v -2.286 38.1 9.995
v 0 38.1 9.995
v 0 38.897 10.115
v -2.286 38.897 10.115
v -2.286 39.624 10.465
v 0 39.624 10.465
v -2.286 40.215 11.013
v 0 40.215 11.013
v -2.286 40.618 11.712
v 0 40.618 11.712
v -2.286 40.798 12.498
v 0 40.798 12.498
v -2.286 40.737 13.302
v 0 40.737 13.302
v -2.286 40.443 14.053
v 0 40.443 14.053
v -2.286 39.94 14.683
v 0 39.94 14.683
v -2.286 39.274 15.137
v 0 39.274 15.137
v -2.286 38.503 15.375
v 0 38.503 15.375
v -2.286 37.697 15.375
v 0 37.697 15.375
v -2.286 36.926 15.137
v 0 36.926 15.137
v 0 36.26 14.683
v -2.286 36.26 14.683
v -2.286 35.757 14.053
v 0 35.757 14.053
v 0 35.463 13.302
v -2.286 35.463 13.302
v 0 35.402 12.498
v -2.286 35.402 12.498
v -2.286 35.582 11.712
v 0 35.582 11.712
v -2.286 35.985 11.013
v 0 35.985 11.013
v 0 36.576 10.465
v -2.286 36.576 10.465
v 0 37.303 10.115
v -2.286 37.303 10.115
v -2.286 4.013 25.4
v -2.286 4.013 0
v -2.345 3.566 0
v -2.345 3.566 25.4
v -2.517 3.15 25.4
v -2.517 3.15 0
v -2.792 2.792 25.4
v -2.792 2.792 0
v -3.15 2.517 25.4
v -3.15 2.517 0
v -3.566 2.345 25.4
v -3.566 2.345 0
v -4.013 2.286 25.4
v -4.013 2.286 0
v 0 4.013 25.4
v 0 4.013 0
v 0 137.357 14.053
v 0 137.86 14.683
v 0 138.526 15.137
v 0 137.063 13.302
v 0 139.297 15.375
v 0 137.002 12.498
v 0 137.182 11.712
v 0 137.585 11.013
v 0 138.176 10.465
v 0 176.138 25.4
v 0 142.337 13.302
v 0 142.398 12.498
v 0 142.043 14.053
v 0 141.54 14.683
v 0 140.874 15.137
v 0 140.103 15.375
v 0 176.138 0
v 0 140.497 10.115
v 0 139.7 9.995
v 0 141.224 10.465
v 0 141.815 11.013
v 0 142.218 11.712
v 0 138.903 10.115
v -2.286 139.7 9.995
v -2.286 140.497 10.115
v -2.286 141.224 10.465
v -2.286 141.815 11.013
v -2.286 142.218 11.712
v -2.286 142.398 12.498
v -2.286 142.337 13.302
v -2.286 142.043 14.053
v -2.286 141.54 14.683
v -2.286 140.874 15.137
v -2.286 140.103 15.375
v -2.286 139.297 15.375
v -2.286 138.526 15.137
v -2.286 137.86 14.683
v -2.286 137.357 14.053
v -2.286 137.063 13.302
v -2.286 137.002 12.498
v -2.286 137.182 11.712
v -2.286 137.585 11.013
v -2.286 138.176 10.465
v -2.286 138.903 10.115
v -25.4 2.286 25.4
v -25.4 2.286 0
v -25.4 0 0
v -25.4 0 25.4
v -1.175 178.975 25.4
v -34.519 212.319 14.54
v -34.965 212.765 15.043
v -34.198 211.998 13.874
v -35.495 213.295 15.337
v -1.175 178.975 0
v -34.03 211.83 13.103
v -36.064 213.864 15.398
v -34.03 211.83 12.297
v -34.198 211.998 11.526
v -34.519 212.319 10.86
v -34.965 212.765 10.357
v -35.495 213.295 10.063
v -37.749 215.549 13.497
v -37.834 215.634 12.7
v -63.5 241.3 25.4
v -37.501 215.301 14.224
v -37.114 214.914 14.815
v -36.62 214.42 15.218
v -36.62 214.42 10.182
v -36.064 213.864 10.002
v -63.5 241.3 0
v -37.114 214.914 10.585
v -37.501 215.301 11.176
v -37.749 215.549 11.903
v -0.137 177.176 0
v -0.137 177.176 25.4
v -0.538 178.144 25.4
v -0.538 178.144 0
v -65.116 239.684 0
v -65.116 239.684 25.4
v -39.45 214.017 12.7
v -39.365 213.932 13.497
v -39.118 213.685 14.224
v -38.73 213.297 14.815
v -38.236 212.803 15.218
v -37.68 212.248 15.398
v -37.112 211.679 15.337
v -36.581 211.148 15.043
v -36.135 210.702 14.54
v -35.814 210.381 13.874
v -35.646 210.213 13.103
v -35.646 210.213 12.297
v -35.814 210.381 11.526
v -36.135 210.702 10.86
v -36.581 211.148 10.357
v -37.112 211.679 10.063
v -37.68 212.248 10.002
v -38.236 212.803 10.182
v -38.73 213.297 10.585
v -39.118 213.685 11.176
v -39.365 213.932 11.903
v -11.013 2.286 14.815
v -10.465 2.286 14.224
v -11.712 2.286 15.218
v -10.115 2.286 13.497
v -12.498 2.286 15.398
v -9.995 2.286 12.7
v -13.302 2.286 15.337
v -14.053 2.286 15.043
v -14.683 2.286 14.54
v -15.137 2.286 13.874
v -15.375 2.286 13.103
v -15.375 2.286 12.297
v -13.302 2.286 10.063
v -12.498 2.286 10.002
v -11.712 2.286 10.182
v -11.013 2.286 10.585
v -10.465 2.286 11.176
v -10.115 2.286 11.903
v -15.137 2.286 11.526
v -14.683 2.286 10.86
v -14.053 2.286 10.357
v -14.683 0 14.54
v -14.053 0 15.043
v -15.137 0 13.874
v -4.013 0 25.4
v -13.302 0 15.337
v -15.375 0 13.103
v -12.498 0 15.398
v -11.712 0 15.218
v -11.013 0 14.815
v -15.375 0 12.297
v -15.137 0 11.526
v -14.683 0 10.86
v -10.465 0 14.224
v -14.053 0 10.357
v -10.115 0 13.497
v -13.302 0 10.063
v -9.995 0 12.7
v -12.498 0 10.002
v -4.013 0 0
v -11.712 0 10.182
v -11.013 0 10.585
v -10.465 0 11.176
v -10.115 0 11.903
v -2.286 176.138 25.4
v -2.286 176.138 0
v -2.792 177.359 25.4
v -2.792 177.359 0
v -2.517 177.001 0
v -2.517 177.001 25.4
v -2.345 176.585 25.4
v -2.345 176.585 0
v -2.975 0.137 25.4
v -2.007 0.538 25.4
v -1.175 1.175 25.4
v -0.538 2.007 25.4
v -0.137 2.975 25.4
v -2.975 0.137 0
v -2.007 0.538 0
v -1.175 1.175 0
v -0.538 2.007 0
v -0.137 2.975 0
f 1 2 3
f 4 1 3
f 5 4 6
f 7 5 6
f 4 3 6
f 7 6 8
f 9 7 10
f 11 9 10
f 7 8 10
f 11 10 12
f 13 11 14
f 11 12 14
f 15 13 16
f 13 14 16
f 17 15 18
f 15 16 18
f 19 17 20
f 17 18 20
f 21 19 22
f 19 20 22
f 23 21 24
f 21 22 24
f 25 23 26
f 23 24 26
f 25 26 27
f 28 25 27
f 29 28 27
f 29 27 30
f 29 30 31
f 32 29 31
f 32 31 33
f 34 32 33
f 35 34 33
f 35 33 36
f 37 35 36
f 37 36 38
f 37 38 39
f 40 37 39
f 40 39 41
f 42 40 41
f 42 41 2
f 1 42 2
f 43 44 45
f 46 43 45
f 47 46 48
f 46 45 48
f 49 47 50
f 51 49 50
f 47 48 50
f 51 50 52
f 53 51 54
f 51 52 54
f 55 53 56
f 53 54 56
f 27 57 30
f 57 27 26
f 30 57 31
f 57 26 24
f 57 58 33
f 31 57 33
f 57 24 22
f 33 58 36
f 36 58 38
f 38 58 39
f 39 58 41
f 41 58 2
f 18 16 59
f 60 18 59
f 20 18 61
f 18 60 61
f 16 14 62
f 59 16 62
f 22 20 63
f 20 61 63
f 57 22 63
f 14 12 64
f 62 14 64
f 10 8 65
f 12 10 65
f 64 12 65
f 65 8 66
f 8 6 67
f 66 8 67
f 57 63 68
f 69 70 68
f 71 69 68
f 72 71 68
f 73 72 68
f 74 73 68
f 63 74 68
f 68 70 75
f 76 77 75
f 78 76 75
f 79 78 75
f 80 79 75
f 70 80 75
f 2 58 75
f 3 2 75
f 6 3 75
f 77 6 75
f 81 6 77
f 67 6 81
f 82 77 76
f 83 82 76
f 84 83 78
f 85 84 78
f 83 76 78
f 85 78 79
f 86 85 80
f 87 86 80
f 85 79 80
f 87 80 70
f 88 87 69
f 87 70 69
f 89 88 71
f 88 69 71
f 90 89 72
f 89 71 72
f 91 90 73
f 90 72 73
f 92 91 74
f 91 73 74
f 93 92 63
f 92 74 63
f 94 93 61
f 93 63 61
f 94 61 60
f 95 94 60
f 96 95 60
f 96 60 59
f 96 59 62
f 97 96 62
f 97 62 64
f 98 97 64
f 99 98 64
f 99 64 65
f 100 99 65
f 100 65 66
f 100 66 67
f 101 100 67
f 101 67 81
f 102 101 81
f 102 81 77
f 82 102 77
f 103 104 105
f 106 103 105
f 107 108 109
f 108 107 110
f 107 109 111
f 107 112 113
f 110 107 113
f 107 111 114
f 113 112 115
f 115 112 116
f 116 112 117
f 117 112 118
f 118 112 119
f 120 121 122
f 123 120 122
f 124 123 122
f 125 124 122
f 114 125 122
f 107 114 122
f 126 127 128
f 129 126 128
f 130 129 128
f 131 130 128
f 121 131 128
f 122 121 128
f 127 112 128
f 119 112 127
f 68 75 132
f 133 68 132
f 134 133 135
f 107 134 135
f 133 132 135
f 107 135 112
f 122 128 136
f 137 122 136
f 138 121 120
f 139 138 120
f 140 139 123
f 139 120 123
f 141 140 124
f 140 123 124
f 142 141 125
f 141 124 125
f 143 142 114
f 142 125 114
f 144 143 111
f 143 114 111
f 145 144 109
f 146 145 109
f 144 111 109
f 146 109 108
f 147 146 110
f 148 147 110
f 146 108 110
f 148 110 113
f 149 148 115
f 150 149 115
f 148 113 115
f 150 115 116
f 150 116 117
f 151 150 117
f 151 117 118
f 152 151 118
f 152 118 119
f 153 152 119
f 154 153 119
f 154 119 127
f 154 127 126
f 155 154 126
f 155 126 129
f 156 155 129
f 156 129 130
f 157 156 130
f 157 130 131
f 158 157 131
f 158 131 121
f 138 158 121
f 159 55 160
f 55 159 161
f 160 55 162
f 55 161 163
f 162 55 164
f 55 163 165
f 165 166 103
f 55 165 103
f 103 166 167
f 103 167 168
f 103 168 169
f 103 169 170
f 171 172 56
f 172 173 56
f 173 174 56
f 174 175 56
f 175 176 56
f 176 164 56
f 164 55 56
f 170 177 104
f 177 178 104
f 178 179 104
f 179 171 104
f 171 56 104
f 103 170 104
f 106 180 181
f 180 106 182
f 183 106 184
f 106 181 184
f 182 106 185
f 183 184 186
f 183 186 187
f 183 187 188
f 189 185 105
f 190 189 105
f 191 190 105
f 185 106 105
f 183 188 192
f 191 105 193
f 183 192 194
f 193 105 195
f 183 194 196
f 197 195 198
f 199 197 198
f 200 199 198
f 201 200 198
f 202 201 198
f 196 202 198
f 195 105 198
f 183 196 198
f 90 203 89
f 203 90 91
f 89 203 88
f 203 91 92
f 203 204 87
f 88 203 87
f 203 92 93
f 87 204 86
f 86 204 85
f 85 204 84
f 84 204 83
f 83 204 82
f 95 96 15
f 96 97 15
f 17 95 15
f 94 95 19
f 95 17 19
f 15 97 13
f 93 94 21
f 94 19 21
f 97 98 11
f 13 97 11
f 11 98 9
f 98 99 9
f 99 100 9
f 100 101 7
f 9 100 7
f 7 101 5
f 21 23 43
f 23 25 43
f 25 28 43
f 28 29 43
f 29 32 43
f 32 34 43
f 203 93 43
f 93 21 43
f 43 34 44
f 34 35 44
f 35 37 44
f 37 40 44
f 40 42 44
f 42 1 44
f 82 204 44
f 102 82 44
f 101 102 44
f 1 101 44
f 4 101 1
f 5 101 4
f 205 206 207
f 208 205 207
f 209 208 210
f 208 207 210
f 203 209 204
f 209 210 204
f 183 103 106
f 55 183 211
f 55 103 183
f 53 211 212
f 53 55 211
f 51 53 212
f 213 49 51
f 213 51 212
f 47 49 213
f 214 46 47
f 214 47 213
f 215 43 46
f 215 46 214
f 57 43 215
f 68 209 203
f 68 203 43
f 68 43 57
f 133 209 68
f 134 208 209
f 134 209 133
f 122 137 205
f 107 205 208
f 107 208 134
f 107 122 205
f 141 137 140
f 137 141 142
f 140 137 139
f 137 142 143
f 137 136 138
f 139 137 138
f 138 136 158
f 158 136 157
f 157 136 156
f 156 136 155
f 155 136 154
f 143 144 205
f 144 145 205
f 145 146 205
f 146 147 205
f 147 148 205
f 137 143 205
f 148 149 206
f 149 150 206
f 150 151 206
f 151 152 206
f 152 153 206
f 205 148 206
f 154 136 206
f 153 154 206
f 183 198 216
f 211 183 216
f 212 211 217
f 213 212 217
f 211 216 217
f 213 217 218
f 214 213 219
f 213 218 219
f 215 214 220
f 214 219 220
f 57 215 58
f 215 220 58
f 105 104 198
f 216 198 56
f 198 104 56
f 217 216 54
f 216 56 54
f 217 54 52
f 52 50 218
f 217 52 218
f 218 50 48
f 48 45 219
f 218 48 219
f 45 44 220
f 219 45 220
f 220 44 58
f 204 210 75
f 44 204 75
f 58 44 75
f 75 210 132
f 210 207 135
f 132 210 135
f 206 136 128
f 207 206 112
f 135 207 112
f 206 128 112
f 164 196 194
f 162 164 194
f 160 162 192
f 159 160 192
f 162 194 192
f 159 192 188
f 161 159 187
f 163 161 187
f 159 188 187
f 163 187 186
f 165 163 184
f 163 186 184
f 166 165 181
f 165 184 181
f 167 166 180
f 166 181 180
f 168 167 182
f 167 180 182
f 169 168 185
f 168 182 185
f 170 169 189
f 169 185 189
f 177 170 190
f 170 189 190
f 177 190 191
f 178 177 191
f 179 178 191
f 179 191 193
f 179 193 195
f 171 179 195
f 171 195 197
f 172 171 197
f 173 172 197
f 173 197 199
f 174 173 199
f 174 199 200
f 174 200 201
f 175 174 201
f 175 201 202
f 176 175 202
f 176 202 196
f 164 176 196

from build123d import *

# Parameters (mm, degrees)
BASE_FLANGE1_DEPTH = 25.4
CUT_EXTRUDE1_REACH = 253.219
SKETCH3_R          = 2.7051
CUT_EXTRUDE2_REACH = 220.156
SKETCH4_R          = 2.7051
CUT_EXTRUDE3_REACH = 253.219
SKETCH5_R          = 2.7051


# Sheet-metal steps are written as plain solids
with BuildPart() as part:
    # Sketch1 → Base-Flange1 (new body)
    with BuildSketch(Plane.XY):
        with BuildLine():
            Line((-25.4, 0), (-4.0132, 0))
            ThreePointArc((-4.0132, 0), (-1.175439066, 1.175439066), (0, 4.0132))
            Line((0, 4.0132), (0, 176.137678131))
            ThreePointArc((0, 176.137678131), (-0.30548666, 177.673463282), (-1.175439066, 178.975439066))
            Line((-1.175439066, 178.975439066), (-63.5, 241.3))
            Line((-63.5, 241.3), (-65.116446102, 239.683553898))
            Line((-65.116446102, 239.683553898), (-2.791885168, 177.358992964))
            ThreePointArc((-2.791885168, 177.358992964), (-2.417475271, 176.798648956), (-2.286, 176.137678131))
            Line((-2.286, 176.137678131), (-2.286, 4.0132))
            ThreePointArc((-2.286, 4.0132), (-2.791885168, 2.791885168), (-4.0132, 2.286))
            Line((-4.0132, 2.286), (-25.4, 2.286))
            Line((-25.4, 2.286), (-25.4, 0))
        make_face()
    extrude(amount=BASE_FLANGE1_DEPTH)

    # Sketch3 → Cut-Extrude1 (cut, up to next)
    with BuildSketch(Plane(origin=(0, 0, 0), x_dir=(0, 0, -1), z_dir=(1, 0, 0)), mode=Mode.PRIVATE) as cut_extrude1_sk1:
        with Locations((-12.7, 38.1)):
            Circle(SKETCH3_R)
    cut_extrude1_tool1 = extrude(cut_extrude1_sk1.sketch, amount=-CUT_EXTRUDE1_REACH, mode=Mode.PRIVATE) & part.part
    # Sketch3 → Cut-Extrude1 (cut, up to next)
    with BuildSketch(Plane(origin=(0, 0, 0), x_dir=(0, 0, -1), z_dir=(1, 0, 0)), mode=Mode.PRIVATE) as cut_extrude1_sk2:
        with Locations((-12.7, 139.7)):
            Circle(SKETCH3_R)
    cut_extrude1_tool2 = extrude(cut_extrude1_sk2.sketch, amount=-CUT_EXTRUDE1_REACH, mode=Mode.PRIVATE) & part.part
    add(cut_extrude1_tool1.solids().sort_by_distance((0, 38.1, 12.7))[0], mode=Mode.SUBTRACT)
    add(cut_extrude1_tool2.solids().sort_by_distance((0, 139.7, 12.7))[0], mode=Mode.SUBTRACT)

    # Sketch4 → Cut-Extrude2 (cut, up to next)
    with BuildSketch(Plane(origin=(88.9, 88.9, 0), x_dir=(0, 0, -1), z_dir=(0.7071067811865462, 0.7071067811865489, 0)), mode=Mode.PRIVATE) as cut_extrude2_sk1:
        with Locations(Location((-12.7, 176.523585695, 0), (0, 0, 90))):
            Circle(SKETCH4_R)
    cut_extrude2_tool1 = extrude(cut_extrude2_sk1.sketch, amount=-CUT_EXTRUDE2_REACH, mode=Mode.PRIVATE) & part.part
    add(cut_extrude2_tool1.solids().sort_by_distance((-35.921024, 213.721024, 12.7))[0], mode=Mode.SUBTRACT)

    # Sketch5 → Cut-Extrude3 (cut, up to next)
    with BuildSketch(Plane.XZ, mode=Mode.PRIVATE) as cut_extrude3_sk1:
        with Locations((-12.7, 12.7)):
            Circle(SKETCH5_R)
    cut_extrude3_tool1 = extrude(cut_extrude3_sk1.sketch, amount=-CUT_EXTRUDE3_REACH, mode=Mode.PRIVATE) & part.part
    add(cut_extrude3_tool1.solids().sort_by_distance((-12.7, 0, 12.7))[0], mode=Mode.SUBTRACT)


solid = part.part
